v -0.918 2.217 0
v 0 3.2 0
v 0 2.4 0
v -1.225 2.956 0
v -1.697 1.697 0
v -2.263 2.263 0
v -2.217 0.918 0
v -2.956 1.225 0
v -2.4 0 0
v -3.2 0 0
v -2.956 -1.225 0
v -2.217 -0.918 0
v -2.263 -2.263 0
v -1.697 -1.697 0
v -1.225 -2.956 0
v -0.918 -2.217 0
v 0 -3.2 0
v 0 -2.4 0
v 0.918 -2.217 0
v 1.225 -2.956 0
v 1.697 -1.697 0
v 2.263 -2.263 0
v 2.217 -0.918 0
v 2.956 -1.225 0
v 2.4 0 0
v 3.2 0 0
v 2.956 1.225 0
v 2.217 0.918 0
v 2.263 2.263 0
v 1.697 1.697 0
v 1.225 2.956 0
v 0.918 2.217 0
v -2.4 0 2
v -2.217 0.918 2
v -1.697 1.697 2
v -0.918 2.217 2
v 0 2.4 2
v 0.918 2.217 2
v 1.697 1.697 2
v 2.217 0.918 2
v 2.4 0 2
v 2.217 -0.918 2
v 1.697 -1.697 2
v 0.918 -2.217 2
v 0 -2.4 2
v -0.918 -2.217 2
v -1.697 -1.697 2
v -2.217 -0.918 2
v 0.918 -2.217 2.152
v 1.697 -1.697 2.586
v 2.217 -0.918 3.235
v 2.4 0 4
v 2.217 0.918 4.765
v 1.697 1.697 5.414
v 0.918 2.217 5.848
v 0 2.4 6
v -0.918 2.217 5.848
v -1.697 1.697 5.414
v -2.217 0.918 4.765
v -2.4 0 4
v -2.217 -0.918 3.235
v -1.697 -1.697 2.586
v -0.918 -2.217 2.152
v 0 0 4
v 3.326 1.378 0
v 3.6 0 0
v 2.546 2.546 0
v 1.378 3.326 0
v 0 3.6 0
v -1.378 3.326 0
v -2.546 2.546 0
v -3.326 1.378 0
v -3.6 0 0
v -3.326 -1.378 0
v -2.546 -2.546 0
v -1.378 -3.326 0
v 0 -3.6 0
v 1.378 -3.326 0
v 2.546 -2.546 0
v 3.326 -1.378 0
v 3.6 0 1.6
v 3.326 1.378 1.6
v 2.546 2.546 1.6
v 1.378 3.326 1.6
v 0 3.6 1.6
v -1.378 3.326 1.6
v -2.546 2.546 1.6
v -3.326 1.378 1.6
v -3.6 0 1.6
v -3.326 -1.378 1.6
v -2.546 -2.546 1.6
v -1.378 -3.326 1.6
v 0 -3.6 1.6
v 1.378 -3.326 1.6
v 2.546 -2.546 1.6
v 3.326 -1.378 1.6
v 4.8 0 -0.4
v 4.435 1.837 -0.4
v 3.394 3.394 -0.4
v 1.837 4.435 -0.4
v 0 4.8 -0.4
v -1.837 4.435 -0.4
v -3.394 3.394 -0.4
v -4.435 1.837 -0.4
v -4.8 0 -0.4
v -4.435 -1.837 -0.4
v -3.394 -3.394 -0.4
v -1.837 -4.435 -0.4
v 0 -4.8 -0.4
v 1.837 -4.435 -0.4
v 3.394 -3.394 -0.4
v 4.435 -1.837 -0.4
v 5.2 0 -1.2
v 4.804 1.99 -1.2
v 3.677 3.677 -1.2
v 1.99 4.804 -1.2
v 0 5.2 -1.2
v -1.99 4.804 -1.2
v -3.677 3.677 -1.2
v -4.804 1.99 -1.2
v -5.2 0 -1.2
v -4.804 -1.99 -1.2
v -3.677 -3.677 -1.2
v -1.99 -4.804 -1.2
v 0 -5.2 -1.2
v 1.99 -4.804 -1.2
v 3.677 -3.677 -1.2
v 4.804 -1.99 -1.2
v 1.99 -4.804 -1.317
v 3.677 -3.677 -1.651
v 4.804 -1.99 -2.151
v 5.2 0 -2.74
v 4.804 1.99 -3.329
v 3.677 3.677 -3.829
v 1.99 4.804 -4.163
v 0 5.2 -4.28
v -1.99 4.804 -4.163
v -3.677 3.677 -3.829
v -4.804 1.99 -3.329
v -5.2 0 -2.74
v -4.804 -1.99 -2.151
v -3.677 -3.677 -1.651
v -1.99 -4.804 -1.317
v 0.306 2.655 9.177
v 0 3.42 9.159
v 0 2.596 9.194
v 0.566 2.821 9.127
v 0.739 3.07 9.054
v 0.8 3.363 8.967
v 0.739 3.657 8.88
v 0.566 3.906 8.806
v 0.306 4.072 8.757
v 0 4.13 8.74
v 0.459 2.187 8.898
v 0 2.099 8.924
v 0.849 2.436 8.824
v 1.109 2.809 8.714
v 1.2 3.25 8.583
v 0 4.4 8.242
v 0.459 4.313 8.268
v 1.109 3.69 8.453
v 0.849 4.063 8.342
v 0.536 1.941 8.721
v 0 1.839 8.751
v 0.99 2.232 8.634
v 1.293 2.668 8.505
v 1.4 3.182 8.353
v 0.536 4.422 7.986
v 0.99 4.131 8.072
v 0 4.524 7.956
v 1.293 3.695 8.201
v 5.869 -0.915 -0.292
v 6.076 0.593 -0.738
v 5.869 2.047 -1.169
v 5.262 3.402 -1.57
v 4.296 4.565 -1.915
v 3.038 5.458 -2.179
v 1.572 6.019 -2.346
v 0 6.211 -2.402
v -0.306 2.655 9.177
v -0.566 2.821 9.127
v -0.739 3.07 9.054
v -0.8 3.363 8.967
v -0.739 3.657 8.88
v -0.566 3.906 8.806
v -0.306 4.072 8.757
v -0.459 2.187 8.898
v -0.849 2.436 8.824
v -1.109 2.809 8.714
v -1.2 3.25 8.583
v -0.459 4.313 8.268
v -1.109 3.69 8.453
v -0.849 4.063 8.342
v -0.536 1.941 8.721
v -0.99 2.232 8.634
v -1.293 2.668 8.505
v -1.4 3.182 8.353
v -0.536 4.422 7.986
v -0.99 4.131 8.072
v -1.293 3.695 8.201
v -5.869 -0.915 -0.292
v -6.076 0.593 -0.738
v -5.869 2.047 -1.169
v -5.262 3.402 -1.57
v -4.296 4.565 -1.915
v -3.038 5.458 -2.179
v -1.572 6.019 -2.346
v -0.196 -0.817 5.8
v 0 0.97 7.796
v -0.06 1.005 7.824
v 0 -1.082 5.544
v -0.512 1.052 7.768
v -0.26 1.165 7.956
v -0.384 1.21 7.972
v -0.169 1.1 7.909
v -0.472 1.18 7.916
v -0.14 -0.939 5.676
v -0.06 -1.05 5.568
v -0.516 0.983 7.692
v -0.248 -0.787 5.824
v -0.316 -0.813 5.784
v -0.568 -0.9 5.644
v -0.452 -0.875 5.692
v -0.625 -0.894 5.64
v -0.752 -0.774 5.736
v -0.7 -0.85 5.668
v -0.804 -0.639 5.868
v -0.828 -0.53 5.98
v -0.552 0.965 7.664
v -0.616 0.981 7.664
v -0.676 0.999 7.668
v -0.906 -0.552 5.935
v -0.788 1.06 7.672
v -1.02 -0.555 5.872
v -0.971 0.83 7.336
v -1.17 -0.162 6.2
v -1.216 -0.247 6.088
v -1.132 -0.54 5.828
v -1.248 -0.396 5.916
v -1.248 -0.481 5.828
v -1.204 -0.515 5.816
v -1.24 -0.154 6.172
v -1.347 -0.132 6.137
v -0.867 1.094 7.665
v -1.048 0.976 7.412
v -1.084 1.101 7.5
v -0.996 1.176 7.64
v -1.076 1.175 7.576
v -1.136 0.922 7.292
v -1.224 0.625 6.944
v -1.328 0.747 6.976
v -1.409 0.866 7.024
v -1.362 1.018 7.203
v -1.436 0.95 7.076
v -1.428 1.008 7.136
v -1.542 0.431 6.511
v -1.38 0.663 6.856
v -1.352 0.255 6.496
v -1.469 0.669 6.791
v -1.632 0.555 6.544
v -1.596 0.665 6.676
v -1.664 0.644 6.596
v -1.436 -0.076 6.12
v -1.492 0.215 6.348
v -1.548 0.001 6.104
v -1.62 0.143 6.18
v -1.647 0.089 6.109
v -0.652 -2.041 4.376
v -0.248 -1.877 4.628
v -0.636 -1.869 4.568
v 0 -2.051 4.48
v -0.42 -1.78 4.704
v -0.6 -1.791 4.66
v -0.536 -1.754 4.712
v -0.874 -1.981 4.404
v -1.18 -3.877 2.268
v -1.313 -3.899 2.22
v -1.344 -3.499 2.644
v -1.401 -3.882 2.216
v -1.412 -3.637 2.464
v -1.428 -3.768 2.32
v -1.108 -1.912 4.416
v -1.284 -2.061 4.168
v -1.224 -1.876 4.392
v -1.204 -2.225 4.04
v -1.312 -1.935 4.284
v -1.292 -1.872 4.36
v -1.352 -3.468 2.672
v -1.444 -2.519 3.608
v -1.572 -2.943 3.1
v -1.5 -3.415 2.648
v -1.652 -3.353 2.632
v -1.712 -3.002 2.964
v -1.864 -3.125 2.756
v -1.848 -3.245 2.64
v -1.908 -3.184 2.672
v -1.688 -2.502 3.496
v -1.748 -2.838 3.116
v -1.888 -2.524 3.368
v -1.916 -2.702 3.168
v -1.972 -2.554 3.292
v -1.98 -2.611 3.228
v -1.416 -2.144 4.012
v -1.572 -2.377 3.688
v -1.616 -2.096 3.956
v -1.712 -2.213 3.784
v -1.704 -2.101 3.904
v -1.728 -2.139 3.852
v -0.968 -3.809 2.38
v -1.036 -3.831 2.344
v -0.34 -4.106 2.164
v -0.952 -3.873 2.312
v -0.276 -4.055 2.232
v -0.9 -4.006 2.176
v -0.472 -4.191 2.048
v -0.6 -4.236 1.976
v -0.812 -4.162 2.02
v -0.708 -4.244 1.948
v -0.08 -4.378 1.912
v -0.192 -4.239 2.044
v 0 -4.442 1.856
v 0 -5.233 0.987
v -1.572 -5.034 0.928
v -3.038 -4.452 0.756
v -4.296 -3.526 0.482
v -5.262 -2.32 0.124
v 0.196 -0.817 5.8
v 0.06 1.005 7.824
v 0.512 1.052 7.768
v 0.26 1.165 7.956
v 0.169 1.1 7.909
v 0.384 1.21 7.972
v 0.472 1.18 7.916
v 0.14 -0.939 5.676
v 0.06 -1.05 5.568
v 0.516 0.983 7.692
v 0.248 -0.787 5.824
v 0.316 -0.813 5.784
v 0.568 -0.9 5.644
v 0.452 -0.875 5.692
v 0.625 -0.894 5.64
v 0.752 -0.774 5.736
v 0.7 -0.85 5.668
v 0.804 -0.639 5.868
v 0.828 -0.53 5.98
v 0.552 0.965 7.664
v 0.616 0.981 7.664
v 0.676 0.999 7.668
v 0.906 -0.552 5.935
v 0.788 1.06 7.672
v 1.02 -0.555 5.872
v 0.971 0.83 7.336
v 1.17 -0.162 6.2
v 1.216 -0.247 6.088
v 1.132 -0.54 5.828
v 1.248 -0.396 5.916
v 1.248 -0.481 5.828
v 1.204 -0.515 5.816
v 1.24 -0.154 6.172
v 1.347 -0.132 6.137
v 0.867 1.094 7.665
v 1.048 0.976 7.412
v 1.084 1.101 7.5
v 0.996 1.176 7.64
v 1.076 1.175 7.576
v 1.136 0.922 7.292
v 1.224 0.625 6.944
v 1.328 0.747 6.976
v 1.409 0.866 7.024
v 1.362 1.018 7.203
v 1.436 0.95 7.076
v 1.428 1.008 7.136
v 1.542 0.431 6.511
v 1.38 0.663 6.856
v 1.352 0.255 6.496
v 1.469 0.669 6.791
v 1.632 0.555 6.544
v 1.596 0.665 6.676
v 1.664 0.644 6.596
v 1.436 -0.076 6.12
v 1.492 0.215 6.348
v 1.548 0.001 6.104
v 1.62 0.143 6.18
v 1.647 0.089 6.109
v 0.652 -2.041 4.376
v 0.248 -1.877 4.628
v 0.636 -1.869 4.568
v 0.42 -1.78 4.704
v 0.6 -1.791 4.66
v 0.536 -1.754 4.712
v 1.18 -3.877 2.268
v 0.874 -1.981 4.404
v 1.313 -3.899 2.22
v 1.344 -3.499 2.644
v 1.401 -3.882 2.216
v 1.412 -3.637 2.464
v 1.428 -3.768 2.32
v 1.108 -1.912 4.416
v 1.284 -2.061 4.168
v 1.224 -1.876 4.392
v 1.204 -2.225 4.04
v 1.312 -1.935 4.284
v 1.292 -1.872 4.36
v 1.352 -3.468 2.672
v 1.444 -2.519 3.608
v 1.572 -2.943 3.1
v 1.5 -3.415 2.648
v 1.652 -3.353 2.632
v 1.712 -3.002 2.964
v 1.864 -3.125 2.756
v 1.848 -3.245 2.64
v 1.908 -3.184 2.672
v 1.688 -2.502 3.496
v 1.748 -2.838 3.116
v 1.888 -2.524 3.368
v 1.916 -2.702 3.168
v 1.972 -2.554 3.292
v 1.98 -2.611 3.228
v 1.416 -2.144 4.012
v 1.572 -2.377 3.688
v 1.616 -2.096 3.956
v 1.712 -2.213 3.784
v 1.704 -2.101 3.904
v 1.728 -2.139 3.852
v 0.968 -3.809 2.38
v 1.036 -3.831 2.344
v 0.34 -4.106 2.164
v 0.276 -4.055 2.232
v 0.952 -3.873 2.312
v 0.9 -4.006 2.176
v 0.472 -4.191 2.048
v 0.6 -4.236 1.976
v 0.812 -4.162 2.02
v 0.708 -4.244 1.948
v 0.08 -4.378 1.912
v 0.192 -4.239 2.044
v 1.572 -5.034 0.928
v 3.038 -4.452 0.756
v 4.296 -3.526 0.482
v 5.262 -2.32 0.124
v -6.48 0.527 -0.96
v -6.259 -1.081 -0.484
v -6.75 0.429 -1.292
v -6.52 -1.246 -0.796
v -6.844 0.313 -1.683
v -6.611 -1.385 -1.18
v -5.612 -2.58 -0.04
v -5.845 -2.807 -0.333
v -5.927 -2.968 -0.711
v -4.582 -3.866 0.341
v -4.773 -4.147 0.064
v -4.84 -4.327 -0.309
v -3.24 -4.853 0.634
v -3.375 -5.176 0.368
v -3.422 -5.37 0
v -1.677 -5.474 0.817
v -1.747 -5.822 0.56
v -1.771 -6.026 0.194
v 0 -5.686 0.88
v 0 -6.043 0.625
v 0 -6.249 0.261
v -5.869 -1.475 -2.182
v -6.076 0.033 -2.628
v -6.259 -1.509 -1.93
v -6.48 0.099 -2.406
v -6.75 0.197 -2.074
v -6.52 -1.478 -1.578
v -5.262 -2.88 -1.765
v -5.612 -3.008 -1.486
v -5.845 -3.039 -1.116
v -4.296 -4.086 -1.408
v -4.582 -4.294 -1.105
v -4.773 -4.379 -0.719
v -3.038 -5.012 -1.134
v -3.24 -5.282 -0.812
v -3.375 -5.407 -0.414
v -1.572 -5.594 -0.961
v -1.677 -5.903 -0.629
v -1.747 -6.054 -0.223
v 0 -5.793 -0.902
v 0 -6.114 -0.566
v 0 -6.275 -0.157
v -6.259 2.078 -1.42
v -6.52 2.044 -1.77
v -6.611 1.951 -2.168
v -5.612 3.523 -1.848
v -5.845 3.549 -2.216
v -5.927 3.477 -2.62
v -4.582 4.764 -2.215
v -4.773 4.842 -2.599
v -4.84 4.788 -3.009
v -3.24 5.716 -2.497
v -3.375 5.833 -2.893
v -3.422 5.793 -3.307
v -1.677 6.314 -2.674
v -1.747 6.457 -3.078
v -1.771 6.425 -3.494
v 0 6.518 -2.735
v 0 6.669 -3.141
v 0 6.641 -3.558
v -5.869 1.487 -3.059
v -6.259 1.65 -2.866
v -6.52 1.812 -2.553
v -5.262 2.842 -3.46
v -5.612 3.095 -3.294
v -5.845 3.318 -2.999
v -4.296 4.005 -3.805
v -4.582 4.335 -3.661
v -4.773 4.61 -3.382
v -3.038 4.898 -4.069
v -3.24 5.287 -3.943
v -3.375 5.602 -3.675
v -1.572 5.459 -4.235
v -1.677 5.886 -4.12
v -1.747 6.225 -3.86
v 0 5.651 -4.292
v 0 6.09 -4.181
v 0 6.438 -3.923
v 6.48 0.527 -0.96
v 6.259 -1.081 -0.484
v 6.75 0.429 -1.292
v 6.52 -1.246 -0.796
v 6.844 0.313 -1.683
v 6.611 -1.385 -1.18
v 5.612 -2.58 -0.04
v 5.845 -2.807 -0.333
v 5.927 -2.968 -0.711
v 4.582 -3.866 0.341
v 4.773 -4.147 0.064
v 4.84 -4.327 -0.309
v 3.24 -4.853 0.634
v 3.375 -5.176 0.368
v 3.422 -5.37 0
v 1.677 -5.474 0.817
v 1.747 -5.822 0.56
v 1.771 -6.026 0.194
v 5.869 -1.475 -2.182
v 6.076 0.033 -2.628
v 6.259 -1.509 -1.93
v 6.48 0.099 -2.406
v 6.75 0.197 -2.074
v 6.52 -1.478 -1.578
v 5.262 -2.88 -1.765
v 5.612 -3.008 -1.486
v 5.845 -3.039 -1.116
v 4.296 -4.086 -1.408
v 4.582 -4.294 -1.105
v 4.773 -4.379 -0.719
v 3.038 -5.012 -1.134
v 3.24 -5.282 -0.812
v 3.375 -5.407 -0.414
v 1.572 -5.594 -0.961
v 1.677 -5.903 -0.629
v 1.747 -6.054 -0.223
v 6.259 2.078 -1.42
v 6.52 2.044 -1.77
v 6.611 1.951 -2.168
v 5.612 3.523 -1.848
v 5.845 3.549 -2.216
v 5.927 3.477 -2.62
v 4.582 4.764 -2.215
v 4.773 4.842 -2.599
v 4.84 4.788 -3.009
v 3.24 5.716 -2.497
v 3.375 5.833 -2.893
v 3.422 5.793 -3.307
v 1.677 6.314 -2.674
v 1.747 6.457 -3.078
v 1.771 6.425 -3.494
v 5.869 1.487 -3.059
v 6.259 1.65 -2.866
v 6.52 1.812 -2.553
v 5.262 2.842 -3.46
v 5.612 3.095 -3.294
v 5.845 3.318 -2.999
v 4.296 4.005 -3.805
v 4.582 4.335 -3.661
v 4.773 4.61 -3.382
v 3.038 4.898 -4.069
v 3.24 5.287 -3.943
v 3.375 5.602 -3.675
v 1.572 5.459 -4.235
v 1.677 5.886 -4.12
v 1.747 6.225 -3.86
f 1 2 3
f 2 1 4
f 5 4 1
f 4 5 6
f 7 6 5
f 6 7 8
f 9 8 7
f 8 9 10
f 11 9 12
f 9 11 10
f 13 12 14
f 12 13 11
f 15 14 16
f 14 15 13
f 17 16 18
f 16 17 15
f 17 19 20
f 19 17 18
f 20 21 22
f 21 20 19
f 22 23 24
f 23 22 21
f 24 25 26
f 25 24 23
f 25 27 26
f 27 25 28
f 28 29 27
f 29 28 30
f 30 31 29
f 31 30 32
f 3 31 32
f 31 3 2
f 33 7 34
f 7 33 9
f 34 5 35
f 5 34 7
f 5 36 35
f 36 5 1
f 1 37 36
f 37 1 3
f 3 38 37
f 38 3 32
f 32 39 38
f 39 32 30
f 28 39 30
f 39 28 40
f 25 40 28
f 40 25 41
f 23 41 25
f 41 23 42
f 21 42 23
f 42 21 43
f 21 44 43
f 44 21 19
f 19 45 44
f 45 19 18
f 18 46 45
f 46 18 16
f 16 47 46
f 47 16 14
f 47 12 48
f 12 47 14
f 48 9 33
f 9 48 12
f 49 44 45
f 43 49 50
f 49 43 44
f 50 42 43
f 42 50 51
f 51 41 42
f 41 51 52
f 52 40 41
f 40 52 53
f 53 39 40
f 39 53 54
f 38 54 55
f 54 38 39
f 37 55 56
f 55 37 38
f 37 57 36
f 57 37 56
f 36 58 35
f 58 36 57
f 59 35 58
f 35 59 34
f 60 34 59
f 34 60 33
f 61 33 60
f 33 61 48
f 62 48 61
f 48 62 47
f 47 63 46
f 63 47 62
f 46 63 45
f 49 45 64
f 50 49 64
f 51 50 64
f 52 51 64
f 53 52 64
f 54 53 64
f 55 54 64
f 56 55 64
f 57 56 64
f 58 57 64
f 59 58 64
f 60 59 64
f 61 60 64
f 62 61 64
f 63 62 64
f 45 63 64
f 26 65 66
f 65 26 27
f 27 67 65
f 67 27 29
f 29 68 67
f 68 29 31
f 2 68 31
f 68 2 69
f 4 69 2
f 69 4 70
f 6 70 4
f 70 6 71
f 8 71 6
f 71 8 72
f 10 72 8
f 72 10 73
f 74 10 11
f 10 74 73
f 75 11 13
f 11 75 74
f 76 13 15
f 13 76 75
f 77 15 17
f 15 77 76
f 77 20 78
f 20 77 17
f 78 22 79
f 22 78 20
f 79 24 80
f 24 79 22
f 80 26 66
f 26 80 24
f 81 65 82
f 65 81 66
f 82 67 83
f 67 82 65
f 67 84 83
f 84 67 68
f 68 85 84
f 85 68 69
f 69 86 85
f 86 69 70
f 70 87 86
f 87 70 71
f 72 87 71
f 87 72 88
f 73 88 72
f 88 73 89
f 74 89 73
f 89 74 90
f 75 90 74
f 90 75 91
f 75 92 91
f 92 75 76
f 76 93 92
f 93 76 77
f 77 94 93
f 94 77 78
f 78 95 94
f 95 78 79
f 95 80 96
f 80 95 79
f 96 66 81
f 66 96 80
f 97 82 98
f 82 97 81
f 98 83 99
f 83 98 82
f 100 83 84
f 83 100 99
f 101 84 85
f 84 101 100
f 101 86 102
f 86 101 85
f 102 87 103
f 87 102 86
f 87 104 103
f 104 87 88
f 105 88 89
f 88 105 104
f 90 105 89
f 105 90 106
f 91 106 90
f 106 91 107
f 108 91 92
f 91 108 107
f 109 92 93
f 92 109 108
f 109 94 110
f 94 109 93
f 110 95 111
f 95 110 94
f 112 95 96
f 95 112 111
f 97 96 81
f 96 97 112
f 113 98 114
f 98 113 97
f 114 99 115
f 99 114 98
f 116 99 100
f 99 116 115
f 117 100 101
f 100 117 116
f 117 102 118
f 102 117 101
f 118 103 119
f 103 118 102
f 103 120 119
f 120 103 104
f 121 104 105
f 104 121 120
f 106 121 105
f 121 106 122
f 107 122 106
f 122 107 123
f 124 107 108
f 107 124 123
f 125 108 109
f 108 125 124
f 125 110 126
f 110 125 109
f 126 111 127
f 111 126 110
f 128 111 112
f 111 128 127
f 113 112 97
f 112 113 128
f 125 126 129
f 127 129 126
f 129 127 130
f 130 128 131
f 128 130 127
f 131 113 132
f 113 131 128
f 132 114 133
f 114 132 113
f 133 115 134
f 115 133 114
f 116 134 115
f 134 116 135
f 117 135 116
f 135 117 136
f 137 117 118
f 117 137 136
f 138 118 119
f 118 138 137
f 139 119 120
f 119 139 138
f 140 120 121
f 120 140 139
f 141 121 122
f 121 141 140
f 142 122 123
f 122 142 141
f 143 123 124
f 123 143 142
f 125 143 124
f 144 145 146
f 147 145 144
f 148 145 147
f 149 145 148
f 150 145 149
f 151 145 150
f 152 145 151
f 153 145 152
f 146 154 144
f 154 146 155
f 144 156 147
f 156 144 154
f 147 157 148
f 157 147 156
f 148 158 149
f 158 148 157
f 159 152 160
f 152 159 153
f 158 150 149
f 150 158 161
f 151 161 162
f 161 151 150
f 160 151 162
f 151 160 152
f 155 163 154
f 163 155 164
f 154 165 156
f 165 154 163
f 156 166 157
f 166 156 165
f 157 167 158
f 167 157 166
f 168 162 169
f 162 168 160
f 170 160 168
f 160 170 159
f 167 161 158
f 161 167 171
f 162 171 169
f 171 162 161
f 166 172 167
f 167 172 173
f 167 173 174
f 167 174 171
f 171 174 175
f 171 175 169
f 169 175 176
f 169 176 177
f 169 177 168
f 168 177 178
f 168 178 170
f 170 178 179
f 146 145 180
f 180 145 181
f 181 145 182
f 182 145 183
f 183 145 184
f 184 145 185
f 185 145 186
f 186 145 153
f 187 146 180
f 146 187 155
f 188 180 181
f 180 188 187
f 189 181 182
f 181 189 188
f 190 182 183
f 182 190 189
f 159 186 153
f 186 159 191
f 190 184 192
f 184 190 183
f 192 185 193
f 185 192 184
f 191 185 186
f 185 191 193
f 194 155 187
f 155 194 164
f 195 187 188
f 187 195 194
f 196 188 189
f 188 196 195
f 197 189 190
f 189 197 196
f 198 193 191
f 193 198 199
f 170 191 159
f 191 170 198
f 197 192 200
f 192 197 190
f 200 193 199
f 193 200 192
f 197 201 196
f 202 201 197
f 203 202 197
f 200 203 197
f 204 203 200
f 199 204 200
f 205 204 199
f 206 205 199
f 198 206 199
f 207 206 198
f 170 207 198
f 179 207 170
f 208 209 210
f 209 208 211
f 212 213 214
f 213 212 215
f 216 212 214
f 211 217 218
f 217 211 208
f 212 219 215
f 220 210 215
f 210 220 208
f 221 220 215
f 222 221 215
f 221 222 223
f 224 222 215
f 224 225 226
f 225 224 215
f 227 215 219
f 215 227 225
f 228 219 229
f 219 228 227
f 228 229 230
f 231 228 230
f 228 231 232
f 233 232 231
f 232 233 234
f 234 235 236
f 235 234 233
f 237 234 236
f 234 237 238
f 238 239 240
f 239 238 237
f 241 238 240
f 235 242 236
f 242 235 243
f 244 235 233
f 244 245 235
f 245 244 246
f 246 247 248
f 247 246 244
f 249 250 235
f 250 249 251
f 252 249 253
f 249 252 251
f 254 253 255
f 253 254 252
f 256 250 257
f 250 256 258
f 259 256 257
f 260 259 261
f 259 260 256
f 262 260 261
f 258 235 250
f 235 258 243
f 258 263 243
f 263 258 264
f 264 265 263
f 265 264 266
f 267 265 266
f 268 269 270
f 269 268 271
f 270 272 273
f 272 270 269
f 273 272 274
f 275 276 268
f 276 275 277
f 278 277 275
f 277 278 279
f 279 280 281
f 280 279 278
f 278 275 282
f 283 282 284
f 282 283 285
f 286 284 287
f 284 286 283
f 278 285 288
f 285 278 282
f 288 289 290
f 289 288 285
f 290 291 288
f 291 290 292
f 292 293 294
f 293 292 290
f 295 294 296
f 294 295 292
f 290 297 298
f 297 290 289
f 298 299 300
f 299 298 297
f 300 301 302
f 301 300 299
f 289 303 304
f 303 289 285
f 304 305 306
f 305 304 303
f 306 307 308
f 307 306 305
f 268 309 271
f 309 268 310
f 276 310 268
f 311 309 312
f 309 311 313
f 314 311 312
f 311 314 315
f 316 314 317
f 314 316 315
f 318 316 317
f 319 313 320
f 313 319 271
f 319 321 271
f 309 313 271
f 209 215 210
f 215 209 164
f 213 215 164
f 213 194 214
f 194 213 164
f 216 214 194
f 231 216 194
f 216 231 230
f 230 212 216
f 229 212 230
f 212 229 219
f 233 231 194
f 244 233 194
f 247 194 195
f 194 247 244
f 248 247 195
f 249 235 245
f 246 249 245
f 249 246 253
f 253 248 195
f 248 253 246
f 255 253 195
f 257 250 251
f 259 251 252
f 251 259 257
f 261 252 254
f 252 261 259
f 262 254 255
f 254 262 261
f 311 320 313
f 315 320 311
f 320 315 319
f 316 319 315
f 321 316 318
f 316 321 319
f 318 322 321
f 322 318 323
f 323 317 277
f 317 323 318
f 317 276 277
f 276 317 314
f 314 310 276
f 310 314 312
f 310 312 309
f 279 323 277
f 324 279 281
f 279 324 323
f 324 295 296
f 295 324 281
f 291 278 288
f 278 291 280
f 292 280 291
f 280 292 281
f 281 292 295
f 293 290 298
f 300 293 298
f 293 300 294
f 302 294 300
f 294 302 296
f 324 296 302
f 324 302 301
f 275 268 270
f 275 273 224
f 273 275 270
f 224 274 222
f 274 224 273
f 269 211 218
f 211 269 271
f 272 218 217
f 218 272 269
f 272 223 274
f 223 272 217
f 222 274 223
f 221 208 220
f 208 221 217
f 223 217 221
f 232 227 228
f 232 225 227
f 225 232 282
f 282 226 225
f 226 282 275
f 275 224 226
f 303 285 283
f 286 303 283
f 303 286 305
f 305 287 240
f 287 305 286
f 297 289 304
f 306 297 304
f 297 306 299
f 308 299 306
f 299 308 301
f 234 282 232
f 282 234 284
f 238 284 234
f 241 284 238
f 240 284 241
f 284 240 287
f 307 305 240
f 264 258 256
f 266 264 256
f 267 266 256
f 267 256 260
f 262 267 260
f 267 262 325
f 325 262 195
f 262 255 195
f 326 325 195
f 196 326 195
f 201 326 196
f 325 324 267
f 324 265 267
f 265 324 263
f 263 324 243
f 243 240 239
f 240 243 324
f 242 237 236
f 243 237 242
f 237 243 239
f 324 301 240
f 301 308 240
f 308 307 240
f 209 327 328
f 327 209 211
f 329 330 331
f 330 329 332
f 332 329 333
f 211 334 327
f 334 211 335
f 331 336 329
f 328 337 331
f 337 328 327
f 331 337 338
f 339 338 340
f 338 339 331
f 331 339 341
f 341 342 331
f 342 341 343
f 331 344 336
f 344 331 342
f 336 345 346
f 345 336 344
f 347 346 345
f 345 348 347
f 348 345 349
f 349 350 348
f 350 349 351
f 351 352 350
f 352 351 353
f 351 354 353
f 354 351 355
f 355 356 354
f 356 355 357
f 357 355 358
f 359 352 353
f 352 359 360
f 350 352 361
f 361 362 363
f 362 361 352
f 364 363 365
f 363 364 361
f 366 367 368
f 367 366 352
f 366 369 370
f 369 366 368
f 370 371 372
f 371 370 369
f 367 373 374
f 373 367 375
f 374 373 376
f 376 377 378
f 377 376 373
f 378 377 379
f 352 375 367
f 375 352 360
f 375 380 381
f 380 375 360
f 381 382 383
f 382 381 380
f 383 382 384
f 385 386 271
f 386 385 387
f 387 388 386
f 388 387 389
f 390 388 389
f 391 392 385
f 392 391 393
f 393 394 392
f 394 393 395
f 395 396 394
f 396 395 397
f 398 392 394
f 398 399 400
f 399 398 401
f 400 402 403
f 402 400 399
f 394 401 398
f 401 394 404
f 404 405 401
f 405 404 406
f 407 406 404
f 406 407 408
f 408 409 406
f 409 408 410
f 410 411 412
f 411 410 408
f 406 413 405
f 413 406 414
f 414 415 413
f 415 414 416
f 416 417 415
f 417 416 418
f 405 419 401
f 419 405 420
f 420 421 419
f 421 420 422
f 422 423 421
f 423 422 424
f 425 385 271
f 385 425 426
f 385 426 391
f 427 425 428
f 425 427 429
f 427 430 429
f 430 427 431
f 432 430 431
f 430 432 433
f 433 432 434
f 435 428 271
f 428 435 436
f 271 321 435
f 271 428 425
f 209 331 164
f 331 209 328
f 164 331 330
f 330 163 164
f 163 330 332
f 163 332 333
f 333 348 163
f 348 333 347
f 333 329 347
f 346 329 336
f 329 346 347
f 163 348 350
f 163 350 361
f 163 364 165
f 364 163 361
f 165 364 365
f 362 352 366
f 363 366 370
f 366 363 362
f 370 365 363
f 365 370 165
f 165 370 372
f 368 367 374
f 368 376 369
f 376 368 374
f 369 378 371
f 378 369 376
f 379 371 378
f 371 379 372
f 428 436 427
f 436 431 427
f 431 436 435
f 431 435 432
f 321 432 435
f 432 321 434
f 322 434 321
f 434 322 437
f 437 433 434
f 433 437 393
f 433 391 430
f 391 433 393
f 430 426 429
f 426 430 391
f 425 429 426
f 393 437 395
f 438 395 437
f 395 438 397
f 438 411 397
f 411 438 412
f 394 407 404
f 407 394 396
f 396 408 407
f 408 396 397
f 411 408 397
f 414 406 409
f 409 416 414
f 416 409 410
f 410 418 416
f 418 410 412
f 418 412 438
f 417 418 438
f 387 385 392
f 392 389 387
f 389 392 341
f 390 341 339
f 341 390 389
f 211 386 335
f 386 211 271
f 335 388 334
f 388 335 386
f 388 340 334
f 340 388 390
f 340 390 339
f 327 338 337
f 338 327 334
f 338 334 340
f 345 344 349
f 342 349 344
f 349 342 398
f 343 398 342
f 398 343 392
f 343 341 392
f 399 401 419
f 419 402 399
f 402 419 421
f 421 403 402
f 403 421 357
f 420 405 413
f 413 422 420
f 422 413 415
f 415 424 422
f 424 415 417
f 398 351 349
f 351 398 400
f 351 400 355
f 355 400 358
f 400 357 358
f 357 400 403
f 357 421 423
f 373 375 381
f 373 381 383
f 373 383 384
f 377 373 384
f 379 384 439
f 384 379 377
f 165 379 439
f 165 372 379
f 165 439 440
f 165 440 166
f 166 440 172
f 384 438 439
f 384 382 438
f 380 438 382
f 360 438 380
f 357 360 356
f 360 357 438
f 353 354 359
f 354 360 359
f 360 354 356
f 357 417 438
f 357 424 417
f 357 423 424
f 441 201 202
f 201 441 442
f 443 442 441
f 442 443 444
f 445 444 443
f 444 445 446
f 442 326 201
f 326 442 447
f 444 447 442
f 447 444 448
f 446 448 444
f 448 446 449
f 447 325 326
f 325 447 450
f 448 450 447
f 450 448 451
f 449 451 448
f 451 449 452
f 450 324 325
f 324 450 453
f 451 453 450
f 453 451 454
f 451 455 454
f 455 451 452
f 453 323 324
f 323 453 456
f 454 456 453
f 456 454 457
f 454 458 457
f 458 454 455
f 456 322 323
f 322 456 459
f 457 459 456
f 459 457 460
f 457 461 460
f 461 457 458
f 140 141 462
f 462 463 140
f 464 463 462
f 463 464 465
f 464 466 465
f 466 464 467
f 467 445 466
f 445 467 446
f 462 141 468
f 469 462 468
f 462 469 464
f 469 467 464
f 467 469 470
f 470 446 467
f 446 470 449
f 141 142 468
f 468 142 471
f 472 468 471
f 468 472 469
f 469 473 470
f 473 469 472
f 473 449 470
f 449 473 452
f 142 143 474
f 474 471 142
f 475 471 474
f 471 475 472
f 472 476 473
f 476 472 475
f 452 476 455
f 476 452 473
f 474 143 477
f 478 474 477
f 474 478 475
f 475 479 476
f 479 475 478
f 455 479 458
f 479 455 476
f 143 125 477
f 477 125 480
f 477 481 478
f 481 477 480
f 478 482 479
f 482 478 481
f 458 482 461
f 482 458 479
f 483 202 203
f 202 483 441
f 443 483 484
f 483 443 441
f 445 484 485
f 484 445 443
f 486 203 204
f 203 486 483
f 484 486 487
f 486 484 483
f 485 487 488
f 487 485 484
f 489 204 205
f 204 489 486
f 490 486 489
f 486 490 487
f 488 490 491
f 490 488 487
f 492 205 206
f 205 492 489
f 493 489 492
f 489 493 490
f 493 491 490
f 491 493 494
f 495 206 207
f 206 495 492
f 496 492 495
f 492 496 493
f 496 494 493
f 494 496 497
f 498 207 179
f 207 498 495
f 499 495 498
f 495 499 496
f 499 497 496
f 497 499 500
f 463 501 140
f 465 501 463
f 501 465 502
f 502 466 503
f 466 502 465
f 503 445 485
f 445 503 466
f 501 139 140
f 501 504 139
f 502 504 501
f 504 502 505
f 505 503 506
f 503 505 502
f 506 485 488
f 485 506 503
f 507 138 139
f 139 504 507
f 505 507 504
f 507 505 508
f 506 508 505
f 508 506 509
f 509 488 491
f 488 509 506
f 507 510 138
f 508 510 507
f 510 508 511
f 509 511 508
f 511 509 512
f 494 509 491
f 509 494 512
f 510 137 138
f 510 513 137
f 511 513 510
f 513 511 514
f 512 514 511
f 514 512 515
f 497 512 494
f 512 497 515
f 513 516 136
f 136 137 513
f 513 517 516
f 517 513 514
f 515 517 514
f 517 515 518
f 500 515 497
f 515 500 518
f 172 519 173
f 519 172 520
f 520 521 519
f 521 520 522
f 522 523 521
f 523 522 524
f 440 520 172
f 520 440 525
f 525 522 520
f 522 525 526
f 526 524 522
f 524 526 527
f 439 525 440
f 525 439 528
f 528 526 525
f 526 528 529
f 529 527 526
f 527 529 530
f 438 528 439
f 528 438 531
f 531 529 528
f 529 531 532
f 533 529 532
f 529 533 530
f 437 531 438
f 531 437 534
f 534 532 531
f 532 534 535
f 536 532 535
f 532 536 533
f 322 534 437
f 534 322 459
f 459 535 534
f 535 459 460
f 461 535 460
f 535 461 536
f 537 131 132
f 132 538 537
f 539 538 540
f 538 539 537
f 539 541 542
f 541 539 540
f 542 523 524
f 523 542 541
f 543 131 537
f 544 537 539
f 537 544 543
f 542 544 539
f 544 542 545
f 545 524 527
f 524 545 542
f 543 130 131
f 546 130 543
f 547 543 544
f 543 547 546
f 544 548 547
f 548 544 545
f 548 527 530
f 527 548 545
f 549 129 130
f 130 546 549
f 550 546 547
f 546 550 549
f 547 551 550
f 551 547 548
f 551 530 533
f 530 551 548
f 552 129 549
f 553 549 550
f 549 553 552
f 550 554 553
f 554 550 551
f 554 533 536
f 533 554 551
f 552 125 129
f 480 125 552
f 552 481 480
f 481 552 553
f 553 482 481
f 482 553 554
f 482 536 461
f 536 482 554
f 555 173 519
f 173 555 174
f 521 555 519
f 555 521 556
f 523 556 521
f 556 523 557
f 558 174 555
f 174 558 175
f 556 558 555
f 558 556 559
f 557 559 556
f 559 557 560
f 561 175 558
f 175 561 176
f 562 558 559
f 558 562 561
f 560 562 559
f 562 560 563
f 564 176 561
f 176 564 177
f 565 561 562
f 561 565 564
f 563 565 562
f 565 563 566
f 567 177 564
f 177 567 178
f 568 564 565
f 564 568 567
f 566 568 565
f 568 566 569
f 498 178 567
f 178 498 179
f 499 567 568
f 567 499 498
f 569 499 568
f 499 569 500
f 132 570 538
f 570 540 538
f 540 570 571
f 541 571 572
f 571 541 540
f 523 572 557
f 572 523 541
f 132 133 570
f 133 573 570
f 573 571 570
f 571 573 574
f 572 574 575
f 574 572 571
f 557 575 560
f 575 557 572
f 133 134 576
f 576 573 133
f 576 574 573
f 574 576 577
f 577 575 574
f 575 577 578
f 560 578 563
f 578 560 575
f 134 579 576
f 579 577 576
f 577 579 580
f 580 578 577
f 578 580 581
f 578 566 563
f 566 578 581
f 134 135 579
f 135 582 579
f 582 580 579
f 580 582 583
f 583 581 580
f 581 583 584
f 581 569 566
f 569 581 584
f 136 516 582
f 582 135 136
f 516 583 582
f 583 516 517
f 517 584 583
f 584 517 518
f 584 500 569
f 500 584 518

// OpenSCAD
use <../lib.scad>
use <s/12894p01s01.scad>
use <s/12894s01.scad>
use <s/12894s04.scad>
function ldraw_lib__12894p01() = [
// 0 Minifig Hat Cone with Black Rim and Two Pom-Pom Pattern
// 0 Name: 12894p01.dat
// 0 Author: Gerald Lasser [GeraldLasser]
// 0 !LDRAW_ORG Part UPDATE 2026-01
// 0 !LICENSE Licensed under CC BY 4.0 : see CAreadme.txt
// 
// 0 BFC CERTIFY CCW
  [0,"BFC","CERTIFY"],
  [0,"BFC","CCW"],
// 
// 0 !CATEGORY Minifig Headwear
// 
// 0 !KEYWORDS Bricklink 12894pb01, Brickowl 962218, Brickset 13376, CMF
// 0 !KEYWORDS Rebrickable 12894pr0001, Sad Clown, Series 10
// 
// 0 !HISTORY 2026-01-29 [OrionP] Official Update 2026-01
// 
// 1 16 0 0 0 1 0 0 0 1 0 0 0 1 s\12894s01.dat
  [1,16,0,0,0,1,0,0,0,1,0,0,0,1, ldraw_lib__s__12894s01()],
// 
// 1 16 0 0 0 -1 0 0 0 1 0 0 0 1 s\12894p01s01.dat
  [1,16,0,0,0,-1,0,0,0,1,0,0,0,1, ldraw_lib__s__12894p01s01()],
// 1 16 0 0 0 1 0 0 0 1 0 0 0 1 s\12894p01s01.dat
  [1,16,0,0,0,1,0,0,0,1,0,0,0,1, ldraw_lib__s__12894p01s01()],
// 1 0 0 0 0 -1 0 0 0 1 0 0 0 1 s\12894s04.dat
  [1,0,0,0,0,-1,0,0,0,1,0,0,0,1, ldraw_lib__s__12894s04()],
// 1 0 0 0 0 1 0 0 0 1 0 0 0 1 s\12894s04.dat
  [1,0,0,0,0,1,0,0,0,1,0,0,0,1, ldraw_lib__s__12894s04()],
];
module ldraw_lib__12894p01(step=0, col=false, unit=2/5, alt=false, line=0.2, solid=!$preview)
    makepoly(ldraw_lib__12894p01(), step=step, col=col, unit=unit, alt=alt, line=line, solid=solid);
ldraw_lib__12894p01(line=0.2);
